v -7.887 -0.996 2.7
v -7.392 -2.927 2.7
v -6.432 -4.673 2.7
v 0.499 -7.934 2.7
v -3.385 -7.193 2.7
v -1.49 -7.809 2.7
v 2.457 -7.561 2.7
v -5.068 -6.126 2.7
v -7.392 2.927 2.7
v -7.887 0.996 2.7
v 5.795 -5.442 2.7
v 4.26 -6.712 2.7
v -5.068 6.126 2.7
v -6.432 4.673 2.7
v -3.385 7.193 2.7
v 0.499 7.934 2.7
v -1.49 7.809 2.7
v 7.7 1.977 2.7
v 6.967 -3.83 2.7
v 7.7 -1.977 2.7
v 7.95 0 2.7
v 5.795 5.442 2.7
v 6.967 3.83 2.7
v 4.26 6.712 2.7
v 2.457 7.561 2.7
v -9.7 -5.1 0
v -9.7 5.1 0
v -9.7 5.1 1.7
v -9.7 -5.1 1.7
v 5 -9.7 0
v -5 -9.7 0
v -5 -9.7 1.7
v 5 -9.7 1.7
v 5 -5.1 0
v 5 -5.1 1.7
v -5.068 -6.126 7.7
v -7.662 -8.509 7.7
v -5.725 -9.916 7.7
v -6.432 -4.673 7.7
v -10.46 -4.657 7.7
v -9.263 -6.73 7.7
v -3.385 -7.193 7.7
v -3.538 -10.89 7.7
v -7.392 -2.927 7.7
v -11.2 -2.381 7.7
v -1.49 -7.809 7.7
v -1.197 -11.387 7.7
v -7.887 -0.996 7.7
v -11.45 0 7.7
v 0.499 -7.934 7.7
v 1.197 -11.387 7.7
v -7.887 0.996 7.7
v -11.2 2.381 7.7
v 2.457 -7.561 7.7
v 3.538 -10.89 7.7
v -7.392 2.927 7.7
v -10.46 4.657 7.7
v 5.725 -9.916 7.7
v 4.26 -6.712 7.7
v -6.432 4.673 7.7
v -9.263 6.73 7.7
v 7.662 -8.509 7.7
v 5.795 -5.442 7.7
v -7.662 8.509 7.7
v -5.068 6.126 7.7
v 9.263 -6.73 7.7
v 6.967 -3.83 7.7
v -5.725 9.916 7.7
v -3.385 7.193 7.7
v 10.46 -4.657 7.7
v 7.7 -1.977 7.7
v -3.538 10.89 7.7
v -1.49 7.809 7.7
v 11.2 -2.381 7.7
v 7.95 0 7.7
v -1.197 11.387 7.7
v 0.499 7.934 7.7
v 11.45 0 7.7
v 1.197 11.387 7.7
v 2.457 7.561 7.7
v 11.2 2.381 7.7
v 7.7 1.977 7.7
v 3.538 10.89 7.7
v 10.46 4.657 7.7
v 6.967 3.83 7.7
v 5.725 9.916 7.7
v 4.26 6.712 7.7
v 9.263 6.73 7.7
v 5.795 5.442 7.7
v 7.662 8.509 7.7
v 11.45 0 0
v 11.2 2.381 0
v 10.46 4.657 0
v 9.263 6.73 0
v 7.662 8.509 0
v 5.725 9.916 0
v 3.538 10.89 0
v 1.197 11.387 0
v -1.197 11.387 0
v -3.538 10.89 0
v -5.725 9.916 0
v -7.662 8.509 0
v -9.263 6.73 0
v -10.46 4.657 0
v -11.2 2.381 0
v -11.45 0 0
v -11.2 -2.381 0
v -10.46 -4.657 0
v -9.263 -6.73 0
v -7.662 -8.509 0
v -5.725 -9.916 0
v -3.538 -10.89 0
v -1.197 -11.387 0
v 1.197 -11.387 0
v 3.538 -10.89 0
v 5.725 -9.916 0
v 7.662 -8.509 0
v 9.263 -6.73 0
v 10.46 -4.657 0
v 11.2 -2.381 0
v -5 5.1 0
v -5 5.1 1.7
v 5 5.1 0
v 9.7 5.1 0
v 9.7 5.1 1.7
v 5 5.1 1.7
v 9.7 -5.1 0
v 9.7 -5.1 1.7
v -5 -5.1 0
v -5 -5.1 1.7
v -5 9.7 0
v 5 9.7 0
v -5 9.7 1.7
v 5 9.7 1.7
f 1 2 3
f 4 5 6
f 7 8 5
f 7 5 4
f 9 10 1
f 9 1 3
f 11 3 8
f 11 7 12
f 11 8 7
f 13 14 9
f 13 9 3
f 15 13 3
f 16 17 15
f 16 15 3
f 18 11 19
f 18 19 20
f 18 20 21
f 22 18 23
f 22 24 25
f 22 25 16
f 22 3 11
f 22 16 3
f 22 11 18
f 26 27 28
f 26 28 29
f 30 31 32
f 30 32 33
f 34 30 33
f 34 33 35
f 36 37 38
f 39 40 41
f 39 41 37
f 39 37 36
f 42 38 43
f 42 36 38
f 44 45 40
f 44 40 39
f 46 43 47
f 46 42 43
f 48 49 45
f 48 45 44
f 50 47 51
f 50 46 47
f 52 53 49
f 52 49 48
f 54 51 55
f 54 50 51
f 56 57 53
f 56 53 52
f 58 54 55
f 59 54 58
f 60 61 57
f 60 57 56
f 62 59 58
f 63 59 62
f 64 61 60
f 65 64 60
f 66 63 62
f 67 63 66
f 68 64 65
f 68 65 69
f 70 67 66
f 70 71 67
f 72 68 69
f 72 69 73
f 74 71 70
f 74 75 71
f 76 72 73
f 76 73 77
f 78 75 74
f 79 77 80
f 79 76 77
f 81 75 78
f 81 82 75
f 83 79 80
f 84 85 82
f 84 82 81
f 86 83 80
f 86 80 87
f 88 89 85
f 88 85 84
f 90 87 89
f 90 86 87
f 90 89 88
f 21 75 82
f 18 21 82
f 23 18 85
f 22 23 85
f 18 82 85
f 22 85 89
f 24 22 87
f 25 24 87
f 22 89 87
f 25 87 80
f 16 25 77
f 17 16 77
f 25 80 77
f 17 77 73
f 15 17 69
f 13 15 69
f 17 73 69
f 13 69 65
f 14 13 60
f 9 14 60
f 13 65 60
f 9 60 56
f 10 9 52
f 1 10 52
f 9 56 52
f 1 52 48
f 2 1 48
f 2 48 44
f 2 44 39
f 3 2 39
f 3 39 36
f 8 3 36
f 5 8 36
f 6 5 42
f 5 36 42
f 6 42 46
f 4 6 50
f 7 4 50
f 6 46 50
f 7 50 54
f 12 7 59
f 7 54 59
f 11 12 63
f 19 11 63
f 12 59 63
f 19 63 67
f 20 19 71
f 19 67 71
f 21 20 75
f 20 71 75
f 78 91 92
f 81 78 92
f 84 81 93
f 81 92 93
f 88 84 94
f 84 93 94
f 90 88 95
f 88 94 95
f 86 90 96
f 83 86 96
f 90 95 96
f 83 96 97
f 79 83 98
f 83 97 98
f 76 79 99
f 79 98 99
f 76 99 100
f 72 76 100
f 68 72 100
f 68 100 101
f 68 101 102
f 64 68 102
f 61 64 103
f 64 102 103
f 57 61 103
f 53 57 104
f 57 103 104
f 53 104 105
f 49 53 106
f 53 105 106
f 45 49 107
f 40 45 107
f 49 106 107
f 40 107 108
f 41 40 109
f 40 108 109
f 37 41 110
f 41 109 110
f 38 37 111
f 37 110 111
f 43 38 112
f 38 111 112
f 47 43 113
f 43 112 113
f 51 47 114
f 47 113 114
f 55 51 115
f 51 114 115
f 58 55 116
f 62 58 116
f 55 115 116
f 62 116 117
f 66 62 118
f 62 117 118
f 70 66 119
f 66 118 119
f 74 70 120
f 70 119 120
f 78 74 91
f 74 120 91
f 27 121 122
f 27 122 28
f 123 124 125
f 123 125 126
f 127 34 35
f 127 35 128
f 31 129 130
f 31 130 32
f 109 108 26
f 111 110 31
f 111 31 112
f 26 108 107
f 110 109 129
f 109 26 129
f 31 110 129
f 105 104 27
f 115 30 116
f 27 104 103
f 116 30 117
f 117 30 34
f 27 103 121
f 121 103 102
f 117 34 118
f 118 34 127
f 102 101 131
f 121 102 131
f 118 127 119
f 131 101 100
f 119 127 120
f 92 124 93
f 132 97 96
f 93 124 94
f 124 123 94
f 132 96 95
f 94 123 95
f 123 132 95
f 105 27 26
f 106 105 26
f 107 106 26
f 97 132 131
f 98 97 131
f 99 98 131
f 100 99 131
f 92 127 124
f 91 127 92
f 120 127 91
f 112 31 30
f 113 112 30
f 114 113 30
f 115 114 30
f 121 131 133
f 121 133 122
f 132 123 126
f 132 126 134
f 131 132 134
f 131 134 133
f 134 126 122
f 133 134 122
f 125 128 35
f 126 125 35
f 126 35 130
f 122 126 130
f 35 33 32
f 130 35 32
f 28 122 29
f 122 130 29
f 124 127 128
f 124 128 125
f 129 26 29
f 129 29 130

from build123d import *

# Parameters (mm, degrees)
SKETCH_R        = 11.45
PAD_DEPTH       = 7.7
SKETCH003_R     = 7.95
POCKET_DEPTH    = 5
POCKET001_DEPTH = 1.7


with BuildPart() as part:
    # Sketch → Pad (new body)
    with BuildSketch(Plane.XY):
        Circle(SKETCH_R)
    extrude(amount=PAD_DEPTH)

    # Sketch003 (on Face3 of Pad) → Pocket (cut)
    with BuildSketch(Plane.XY.offset(7.7)):
        Circle(SKETCH003_R)
    extrude(amount=-POCKET_DEPTH, mode=Mode.SUBTRACT)

    # Sketch002 → Pocket001 (cut)
    with BuildSketch(Plane(origin=(0, 0, 0), x_dir=(1, 0, 0), z_dir=(0, 0, -1))):
        Polygon((-9.7, 5.1), (-5, 5.1), (-5, 9.7), (5, 9.7), (5, 5.1), (9.7, 5.1), (9.7, -5.1), (5, -5.1), (5, -9.7), (-5, -9.7), (-5, -5.1), (-9.7, -5.1), align=None)
    extrude(amount=-POCKET001_DEPTH, mode=Mode.SUBTRACT)


solid = part.part
